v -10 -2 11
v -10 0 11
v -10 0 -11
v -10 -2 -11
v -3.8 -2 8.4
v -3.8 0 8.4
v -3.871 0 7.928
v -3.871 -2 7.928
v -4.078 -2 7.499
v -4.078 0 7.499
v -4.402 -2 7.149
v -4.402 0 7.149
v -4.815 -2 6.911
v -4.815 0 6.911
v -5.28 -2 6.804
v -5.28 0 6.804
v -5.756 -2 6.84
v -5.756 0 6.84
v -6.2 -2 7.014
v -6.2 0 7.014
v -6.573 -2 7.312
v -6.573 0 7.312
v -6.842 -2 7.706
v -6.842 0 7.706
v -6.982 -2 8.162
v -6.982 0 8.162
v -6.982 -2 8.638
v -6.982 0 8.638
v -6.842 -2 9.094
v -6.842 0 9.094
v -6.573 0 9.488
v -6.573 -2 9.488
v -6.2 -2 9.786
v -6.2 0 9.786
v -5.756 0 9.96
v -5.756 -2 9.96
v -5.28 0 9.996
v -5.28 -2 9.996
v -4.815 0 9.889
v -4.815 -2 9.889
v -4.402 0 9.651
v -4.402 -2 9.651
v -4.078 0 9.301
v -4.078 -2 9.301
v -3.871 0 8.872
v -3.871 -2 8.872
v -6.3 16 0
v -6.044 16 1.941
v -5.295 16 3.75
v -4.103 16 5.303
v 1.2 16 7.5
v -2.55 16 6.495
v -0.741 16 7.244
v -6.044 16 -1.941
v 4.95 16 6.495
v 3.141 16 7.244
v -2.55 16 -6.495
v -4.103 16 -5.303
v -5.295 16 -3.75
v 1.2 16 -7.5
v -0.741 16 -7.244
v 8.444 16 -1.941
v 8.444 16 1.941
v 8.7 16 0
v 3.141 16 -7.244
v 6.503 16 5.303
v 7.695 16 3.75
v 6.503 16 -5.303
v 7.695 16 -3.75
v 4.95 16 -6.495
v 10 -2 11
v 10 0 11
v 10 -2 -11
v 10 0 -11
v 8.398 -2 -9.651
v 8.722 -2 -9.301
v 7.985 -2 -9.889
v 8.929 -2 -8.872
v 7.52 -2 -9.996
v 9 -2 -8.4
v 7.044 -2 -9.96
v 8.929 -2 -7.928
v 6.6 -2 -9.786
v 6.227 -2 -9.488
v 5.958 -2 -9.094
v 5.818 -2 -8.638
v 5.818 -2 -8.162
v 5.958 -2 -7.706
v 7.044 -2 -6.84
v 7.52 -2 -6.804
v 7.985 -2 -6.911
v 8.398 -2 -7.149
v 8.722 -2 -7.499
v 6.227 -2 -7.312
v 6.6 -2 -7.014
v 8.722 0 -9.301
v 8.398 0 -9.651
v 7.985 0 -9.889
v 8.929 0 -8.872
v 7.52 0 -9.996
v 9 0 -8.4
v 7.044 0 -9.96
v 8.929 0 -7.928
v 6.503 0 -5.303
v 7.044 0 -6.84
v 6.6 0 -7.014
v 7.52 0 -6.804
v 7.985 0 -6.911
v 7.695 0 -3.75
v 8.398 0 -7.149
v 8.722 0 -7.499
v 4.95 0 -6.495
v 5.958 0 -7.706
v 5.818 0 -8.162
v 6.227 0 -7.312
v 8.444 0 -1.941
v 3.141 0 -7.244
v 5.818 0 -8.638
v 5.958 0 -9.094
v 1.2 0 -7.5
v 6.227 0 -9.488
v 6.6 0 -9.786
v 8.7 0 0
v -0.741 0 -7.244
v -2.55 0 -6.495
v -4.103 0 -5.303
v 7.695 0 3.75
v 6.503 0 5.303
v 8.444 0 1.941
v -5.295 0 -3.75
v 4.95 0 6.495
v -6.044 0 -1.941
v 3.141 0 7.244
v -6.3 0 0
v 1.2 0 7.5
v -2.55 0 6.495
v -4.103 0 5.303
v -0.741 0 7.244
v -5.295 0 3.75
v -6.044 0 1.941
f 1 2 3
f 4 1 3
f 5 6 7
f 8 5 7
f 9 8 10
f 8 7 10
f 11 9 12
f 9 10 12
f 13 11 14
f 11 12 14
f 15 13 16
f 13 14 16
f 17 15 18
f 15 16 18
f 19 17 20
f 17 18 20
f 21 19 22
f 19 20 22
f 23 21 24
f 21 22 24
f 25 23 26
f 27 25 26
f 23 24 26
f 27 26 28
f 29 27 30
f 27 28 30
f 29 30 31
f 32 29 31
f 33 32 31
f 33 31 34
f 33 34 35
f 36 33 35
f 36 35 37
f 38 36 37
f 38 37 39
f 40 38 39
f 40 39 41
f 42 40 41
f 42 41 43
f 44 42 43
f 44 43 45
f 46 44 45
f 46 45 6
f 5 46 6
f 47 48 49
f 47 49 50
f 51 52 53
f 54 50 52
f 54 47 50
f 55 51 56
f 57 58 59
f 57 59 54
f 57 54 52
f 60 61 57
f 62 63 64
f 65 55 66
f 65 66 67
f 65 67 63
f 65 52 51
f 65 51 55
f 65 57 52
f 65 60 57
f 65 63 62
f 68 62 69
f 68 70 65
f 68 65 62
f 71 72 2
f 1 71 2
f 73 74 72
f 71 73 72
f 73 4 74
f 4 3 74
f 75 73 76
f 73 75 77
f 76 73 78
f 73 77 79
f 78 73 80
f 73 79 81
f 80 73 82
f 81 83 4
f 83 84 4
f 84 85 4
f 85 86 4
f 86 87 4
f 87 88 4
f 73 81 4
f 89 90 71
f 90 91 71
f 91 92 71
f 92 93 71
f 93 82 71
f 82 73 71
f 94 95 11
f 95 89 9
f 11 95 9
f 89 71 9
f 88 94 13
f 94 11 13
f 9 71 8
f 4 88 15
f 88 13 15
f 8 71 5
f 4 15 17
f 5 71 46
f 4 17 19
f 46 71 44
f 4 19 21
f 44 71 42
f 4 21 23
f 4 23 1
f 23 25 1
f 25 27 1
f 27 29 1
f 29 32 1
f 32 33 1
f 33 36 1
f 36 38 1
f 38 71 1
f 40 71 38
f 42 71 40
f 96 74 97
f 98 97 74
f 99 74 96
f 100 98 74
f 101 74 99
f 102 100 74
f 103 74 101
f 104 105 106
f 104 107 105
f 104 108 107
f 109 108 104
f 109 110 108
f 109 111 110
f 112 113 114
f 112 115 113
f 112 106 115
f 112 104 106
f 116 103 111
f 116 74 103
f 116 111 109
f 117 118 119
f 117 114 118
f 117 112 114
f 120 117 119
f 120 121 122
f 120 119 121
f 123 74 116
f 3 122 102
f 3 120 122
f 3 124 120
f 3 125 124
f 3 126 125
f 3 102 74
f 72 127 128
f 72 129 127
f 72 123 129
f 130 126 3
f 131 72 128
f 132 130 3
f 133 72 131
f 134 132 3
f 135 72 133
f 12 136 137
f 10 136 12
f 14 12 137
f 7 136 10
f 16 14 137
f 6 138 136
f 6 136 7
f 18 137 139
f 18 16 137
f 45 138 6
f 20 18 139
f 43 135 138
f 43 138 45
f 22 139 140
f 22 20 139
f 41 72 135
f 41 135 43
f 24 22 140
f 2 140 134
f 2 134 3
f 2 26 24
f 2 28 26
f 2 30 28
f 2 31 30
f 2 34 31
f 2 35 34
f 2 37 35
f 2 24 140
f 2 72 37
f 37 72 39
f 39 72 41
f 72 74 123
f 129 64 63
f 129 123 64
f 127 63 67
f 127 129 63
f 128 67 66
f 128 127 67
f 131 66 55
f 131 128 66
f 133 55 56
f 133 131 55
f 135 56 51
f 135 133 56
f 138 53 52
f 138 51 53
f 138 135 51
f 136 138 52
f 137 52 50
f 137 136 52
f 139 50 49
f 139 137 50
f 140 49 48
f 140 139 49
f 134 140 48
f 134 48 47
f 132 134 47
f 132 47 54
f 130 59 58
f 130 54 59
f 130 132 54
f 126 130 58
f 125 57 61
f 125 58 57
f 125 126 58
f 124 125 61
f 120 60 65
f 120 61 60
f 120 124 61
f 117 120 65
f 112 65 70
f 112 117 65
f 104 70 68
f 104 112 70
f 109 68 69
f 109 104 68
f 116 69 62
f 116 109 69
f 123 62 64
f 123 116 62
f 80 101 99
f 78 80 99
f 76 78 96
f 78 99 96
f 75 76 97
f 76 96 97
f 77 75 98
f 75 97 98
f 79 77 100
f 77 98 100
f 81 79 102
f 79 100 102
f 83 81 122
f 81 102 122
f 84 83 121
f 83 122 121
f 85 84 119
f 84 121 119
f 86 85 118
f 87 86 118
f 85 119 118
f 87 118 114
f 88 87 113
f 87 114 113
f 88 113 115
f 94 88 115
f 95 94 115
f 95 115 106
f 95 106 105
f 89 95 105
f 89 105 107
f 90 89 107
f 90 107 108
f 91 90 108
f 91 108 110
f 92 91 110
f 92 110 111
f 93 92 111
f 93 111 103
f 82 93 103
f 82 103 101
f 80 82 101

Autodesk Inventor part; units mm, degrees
ref_plane "YZ Plane" through (0, 0, 0) normal (1, 0, 0) x (0, 1, 0)
ref_plane "XZ Plane" through (0, 0, 0) normal (0, 1, 0) x (-1, 0, 0)
ref_plane "XY Plane" through (0, 0, 0) normal (0, 0, 1) x (1, 0, 0)
sketch "Sketch1" plane through (0, 0, 0) normal (0, 1, 0) x (-1, 0, 0)
  line L0 (-10, 11) -> (10, 11)
  line L1 (10, 11) -> (10, -11)
  line L2 (10, -11) -> (-10, -11)
  line L3 (-10, -11) -> (-10, 11)
  line L4 (-10, 11) -> (10, -11) construction
  line L5 (10, 11) -> (-10, -11) construction
  point P0 (0, 0)
  dimension "d0" = 20
  dimension "d1" = 22
extrude "Extrusion1" add sketch "Sketch1" against normal blind 2
sketch "Sketch2" plane through (0, 0, 0) normal (0, 1, 0) x (1, 0, 0)
  circle A0 centre (1.2, 0) radius 7.5
  line L0 (-10, 11) -> (10, 11) projected
  line L1 (10, -11) -> (10, 11)
  dimension "d4" = 15
  dimension "d10" = 8.8
extrude "Extrusion2" add sketch "Sketch2" along normal blind 16
sketch "Sketch3" plane through (0, 0, 0) normal (0, 1, 0) x (1, 0, 0)
  line L0 (-10, -8.4) -> (-10, -11)
  circle A0 centre (-5.4, -8.4) radius 1.6
  circle A1 centre (7.4, 8.4) radius 1.6
  point P0 (0, 0)
  point P1 (10, 11)
  dimension "d9" = 3.2
  dimension "d13" = 3.2
extrude "Extrusion3" cut sketch "Sketch3" against normal up to surface (2 mm away)
properties part number "SONIC"
